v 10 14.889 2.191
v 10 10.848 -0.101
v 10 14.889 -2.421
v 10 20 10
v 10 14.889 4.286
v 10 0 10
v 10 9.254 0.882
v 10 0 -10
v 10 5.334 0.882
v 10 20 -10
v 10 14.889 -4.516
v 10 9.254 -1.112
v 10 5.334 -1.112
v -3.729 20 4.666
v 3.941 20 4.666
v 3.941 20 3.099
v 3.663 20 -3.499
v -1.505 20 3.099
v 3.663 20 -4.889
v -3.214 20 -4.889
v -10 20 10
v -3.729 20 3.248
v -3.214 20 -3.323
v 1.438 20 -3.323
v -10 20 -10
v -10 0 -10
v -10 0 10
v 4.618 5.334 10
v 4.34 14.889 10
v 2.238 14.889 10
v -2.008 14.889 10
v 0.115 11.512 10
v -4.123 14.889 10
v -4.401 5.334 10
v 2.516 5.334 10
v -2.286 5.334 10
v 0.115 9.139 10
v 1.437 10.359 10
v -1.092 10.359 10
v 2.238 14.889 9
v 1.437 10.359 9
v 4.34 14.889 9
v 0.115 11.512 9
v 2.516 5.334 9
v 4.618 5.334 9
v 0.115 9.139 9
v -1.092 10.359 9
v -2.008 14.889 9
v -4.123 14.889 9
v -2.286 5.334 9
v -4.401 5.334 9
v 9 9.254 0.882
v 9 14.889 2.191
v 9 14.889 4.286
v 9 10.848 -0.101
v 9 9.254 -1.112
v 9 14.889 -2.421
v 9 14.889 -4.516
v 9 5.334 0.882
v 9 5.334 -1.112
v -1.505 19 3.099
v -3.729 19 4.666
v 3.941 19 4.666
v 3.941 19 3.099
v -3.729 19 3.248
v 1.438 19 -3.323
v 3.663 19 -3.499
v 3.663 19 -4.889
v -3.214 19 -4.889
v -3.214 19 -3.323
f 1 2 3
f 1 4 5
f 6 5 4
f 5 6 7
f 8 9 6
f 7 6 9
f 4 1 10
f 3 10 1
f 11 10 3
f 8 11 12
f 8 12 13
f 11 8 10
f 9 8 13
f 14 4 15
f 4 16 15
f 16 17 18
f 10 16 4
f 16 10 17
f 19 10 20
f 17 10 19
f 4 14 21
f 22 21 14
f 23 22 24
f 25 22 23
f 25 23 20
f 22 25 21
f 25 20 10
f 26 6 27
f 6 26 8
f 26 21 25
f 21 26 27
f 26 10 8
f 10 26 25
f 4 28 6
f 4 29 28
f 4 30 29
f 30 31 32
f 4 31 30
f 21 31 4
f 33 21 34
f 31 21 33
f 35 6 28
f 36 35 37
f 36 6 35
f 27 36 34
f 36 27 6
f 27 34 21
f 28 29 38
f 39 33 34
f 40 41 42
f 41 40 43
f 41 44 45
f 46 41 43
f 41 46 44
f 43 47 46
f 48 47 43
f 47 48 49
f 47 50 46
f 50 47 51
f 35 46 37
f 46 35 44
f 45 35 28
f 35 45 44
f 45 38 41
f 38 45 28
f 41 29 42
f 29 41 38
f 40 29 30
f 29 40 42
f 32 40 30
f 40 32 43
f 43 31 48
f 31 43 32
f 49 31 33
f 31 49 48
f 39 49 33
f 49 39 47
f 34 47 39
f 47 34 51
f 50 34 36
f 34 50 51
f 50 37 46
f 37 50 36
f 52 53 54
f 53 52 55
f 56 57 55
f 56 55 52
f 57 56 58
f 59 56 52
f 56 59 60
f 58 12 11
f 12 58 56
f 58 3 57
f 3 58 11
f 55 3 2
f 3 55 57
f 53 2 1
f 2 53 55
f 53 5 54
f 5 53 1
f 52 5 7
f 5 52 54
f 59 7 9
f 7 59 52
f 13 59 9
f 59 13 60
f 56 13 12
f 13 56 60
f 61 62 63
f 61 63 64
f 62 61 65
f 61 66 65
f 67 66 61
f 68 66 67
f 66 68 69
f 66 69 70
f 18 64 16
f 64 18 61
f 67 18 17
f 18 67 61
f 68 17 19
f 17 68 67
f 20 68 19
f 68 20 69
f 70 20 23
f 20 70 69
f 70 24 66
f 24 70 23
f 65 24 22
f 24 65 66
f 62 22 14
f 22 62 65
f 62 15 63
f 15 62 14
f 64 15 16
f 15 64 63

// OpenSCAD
// Calibration cube 20x20
font = "Arial:style=Bold";

$fn=100;

cube_size = 20;
letter_size = 0.5*cube_size;
letter_height = 0.2*letter_size;

o = cube_size / 2 - letter_height / 2;

module letter(Txt) {
  color("Yellow")
  linear_extrude(height = letter_height) {
    text(Txt, size = letter_size, font = font, halign = "center", valign = "center");
  }
}

rotate(90,[-1, 0, 0]) translate([0, 0, 10]) difference() {
  color("gray") 
  cube(cube_size, center = true);
  translate([0, -o, 0]) rotate([90, 0, 0]) letter("X");
  translate([o, 0, 0]) rotate([90, 0, 90]) letter("Y");
  translate([0, 0, o])  letter("Z");
}
